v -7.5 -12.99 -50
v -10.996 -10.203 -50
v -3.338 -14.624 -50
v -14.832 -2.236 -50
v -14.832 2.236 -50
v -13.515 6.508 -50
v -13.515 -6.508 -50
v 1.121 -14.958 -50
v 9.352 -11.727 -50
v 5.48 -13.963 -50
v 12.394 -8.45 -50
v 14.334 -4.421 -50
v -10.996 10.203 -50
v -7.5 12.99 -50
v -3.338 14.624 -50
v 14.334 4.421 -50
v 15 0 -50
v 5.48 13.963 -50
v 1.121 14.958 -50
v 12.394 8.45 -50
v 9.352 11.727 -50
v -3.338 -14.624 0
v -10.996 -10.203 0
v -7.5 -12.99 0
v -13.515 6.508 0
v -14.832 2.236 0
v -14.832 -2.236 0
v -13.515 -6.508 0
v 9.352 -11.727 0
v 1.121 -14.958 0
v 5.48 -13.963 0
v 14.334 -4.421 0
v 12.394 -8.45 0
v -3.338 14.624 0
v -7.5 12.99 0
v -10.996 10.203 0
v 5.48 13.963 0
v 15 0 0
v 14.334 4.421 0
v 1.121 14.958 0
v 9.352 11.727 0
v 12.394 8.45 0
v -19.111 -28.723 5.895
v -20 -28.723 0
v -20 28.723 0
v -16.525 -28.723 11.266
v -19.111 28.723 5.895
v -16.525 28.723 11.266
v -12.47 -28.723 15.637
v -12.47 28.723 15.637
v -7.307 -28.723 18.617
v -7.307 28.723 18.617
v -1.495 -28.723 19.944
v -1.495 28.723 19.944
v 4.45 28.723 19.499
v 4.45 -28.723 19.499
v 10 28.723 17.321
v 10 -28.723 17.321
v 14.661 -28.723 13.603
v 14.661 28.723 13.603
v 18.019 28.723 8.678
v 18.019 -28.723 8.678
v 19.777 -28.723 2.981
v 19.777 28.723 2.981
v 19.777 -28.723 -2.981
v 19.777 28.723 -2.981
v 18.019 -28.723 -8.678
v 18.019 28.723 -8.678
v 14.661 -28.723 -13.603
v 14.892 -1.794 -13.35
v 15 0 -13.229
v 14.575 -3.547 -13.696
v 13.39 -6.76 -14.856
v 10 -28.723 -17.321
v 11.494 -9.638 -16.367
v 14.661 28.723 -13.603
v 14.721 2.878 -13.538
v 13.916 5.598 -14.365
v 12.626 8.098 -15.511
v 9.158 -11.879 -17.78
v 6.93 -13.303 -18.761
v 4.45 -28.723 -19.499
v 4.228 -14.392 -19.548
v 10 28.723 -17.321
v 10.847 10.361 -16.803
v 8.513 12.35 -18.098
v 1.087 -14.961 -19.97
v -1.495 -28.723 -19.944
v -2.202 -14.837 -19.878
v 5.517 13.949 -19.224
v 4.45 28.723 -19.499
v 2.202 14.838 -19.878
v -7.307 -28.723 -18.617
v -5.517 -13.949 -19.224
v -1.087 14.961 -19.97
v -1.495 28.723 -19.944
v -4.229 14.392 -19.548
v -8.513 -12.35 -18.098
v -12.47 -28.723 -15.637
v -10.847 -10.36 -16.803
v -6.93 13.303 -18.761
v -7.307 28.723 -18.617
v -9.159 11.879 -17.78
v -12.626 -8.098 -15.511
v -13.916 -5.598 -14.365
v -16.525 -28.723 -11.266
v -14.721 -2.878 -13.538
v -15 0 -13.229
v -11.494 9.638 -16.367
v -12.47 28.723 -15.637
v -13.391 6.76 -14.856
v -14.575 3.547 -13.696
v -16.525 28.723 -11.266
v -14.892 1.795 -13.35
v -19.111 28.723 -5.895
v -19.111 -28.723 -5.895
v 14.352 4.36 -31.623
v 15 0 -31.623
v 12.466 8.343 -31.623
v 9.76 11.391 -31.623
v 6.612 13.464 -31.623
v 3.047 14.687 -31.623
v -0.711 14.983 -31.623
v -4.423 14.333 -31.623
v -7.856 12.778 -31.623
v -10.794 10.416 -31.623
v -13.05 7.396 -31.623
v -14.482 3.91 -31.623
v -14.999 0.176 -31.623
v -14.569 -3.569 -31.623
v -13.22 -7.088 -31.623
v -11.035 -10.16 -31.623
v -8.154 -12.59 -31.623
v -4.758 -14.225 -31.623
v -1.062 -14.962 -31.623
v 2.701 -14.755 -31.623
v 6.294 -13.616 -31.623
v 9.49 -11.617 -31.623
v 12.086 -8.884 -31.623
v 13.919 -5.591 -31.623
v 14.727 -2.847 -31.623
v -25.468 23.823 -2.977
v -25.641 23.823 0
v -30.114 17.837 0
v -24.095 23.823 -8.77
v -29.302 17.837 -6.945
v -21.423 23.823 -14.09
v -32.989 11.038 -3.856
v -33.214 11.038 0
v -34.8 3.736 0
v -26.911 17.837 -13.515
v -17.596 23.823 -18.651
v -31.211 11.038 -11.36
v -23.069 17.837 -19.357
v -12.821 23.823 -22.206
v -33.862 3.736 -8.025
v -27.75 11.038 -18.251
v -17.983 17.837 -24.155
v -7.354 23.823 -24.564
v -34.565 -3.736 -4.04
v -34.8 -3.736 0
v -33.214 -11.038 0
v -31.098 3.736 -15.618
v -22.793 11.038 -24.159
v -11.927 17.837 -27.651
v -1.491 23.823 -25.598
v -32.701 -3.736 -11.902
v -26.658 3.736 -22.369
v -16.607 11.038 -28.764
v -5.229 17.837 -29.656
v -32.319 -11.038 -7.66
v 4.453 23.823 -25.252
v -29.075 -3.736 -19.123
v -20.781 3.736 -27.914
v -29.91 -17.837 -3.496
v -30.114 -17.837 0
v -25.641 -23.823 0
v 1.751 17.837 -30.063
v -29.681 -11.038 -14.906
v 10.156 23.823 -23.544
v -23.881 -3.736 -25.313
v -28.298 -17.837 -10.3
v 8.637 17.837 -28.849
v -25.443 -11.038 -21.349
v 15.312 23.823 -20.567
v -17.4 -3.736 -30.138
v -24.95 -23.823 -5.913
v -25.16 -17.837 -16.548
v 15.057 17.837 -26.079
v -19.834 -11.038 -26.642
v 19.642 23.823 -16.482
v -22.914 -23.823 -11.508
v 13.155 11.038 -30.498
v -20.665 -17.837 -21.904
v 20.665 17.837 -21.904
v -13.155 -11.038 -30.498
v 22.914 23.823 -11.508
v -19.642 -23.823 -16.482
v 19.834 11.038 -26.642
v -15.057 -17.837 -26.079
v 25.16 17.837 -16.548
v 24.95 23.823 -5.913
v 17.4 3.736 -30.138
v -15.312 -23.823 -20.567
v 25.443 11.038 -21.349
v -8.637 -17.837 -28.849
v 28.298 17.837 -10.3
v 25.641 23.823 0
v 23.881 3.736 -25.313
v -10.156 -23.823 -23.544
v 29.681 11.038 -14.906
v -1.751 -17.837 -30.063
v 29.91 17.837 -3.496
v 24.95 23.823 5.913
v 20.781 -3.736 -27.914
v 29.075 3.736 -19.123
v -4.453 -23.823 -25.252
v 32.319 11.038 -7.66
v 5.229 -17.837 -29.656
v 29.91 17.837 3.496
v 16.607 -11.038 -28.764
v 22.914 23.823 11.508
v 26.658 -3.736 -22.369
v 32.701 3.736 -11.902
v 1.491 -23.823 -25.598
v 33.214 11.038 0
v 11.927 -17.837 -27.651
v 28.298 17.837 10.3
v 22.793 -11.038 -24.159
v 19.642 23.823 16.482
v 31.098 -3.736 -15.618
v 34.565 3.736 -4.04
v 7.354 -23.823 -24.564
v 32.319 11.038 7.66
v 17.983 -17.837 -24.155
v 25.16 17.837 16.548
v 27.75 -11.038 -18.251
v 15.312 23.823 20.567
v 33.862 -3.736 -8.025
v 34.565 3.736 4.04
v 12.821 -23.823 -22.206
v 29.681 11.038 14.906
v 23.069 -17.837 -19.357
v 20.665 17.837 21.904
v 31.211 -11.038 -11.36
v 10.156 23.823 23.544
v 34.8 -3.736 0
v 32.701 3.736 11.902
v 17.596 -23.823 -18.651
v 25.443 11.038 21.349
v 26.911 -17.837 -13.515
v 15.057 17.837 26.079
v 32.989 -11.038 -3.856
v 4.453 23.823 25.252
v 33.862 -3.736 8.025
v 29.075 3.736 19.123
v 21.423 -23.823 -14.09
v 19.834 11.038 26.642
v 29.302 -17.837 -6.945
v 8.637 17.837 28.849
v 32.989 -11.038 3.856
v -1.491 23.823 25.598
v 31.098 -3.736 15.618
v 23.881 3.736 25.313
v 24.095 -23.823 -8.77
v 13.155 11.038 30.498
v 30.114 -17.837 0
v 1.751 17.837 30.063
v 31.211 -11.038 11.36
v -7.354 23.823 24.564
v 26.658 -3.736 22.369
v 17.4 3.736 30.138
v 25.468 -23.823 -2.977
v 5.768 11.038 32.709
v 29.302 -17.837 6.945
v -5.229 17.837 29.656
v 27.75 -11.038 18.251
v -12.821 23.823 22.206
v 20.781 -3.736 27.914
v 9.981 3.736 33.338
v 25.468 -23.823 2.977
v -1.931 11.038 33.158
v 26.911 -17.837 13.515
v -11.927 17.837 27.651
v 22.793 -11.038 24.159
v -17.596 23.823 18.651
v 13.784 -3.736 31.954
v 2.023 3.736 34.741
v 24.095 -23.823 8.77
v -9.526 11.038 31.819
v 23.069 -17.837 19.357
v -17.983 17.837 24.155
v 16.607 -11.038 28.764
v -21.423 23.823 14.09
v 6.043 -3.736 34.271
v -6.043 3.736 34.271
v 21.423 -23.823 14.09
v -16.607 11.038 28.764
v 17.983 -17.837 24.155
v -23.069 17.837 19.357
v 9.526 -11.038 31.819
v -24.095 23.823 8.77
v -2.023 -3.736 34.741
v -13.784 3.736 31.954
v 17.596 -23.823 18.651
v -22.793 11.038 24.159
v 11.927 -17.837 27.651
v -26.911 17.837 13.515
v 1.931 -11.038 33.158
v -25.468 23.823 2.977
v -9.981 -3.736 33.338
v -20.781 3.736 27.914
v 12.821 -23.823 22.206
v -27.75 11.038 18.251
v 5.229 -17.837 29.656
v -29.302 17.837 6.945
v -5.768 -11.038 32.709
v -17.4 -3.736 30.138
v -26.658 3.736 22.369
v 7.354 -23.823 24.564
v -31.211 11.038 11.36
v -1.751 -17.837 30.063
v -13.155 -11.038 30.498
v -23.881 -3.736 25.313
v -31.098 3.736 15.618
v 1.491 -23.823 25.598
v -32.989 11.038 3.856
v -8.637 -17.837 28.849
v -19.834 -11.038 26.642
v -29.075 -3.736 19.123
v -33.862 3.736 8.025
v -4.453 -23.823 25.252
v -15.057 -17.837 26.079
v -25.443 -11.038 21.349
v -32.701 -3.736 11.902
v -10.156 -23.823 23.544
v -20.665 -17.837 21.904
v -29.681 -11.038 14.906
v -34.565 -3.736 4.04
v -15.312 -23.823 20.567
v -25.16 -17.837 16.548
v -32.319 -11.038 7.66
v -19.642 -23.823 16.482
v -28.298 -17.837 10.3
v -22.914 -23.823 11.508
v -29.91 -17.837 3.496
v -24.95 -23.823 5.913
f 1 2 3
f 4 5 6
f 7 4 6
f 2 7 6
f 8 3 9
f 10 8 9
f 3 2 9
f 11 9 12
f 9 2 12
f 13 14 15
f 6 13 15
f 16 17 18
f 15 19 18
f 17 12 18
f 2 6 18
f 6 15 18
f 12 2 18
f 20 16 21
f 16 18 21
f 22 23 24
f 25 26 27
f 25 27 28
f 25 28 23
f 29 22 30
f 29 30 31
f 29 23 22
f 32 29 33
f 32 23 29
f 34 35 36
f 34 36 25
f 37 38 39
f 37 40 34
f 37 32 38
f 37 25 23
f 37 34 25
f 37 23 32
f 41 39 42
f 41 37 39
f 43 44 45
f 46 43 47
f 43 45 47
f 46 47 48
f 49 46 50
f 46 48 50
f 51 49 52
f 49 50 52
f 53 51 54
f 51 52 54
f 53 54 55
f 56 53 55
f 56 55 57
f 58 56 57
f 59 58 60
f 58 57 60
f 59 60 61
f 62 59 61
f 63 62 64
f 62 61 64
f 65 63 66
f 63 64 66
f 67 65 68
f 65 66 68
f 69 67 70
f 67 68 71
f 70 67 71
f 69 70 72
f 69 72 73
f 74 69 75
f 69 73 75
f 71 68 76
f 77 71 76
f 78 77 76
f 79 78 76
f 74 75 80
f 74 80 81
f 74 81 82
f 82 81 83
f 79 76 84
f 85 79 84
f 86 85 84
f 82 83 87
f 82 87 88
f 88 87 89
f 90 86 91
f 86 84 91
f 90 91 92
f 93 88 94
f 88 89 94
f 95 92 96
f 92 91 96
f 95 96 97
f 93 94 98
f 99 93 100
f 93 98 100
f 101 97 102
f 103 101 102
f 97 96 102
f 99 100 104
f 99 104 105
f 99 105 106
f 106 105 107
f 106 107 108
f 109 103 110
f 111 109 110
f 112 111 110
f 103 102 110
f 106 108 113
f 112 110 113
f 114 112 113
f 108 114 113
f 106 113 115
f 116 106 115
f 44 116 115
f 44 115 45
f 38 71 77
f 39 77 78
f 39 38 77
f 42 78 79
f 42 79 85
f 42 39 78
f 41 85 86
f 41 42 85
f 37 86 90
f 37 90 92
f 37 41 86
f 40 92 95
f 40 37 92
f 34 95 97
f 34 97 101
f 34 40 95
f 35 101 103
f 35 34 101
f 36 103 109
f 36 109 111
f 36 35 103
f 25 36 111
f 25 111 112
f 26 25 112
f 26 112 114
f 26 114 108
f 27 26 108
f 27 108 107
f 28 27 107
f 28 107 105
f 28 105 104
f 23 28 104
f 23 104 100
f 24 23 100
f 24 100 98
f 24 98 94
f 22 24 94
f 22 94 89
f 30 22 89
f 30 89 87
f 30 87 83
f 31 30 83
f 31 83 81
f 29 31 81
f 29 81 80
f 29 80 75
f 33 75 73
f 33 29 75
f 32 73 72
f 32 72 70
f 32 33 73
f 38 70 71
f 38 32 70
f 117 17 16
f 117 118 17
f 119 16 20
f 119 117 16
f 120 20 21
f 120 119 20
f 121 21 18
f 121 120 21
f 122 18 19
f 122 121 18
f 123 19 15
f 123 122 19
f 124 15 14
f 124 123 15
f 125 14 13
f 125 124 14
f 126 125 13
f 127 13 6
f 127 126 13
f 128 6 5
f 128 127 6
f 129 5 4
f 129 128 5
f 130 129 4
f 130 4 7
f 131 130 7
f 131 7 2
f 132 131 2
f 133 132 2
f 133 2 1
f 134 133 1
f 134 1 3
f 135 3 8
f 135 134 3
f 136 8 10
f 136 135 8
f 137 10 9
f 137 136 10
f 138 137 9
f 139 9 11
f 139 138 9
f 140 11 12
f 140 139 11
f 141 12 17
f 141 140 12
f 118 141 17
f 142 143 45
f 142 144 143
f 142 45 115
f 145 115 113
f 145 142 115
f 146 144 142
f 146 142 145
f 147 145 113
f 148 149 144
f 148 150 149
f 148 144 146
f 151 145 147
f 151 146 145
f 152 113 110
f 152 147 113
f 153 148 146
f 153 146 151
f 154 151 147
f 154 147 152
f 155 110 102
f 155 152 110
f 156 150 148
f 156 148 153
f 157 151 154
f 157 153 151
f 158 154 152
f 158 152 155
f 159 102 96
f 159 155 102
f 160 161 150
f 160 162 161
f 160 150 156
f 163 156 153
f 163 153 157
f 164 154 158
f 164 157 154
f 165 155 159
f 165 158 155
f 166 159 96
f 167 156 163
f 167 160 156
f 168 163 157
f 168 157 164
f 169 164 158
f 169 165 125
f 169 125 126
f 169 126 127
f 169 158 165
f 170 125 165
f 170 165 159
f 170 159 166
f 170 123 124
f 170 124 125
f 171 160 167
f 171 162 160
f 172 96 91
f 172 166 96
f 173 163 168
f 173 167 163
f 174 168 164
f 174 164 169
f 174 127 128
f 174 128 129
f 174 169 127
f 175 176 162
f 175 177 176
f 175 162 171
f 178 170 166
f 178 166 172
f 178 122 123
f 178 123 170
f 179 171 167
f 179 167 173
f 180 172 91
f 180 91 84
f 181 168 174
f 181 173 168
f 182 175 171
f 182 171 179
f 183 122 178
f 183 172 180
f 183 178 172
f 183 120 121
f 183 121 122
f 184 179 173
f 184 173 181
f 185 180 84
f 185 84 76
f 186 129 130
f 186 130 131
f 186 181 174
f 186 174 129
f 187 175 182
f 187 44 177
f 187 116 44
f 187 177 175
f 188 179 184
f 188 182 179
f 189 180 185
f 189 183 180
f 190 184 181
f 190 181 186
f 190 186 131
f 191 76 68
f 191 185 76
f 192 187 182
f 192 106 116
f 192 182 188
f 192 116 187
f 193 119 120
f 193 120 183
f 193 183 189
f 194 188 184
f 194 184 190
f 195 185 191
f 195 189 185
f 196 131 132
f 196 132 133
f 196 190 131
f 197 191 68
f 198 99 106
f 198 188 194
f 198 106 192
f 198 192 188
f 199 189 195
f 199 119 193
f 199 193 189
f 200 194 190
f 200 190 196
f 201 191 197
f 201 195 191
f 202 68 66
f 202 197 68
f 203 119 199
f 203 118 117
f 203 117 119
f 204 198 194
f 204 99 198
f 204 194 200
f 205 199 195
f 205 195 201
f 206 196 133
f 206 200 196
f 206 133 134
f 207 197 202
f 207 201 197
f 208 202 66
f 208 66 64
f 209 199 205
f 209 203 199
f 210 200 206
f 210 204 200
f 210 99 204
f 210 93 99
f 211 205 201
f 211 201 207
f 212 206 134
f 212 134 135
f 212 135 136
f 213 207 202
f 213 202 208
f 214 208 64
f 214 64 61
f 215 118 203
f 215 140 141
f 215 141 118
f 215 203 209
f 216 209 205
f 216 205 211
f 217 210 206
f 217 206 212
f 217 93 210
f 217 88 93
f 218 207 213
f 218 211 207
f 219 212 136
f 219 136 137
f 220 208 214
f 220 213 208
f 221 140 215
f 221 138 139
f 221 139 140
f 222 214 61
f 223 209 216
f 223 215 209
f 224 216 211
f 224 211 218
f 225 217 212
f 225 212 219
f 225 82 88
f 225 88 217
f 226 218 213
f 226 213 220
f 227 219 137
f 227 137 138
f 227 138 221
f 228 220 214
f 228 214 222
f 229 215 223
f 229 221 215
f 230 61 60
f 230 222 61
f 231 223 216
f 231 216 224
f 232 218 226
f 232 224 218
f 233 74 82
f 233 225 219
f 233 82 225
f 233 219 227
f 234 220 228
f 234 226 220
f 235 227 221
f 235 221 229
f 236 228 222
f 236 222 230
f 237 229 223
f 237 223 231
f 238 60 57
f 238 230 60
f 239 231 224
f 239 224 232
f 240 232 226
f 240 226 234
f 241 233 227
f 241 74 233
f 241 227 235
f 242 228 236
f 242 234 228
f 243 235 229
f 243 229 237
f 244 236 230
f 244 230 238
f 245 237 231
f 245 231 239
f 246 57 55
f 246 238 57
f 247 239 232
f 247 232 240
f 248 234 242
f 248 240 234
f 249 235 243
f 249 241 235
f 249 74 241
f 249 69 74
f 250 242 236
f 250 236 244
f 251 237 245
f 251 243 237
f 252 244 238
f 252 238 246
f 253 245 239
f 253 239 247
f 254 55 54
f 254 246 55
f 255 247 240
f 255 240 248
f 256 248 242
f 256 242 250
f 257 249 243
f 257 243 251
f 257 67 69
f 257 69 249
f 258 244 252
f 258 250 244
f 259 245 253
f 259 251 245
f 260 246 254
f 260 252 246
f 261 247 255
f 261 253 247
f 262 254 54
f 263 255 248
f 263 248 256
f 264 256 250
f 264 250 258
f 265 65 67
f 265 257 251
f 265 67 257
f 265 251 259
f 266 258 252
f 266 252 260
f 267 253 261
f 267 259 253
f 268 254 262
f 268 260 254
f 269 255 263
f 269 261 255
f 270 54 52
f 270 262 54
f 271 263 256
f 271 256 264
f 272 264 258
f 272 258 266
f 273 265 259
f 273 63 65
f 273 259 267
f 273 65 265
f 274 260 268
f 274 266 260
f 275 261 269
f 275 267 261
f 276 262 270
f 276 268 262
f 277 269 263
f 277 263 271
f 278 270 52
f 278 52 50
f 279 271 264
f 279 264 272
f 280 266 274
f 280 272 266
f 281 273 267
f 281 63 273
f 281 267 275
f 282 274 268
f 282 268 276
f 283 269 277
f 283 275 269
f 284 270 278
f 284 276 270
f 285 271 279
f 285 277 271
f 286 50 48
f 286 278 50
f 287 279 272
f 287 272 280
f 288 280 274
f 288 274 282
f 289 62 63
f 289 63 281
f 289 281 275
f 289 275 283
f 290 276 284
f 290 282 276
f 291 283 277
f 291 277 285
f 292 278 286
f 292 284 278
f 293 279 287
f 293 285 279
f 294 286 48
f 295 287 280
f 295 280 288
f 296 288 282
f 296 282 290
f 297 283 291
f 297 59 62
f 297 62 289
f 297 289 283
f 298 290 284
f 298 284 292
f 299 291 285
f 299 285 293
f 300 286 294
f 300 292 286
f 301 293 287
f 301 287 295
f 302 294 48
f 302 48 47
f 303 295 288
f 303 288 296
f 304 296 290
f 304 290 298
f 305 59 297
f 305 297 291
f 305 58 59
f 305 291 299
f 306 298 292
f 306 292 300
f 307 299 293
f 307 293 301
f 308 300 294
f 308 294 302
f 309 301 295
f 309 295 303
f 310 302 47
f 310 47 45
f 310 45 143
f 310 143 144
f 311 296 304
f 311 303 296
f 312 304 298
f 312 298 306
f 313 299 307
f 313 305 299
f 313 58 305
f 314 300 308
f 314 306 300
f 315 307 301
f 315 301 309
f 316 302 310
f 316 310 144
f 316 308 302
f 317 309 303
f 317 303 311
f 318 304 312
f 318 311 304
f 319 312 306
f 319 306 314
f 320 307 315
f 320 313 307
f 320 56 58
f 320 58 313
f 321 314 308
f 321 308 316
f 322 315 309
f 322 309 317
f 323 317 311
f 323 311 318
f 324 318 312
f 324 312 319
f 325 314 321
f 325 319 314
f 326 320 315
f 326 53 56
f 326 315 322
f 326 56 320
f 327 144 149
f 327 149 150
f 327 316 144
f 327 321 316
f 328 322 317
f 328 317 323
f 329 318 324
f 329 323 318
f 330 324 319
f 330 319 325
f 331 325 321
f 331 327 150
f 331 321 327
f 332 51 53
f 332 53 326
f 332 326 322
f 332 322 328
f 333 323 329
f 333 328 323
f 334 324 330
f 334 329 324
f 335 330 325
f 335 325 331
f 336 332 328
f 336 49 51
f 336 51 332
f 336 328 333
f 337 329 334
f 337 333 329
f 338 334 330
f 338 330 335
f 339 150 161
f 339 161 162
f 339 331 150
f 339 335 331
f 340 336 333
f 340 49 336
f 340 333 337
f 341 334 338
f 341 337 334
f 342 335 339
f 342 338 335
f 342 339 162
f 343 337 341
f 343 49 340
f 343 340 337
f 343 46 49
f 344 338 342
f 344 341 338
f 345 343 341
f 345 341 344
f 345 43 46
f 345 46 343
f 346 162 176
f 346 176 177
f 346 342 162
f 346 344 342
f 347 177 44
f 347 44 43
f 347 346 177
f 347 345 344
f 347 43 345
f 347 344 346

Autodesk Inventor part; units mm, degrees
ref_plane "YZ Plane" through (0, 0, 0) normal (1, 0, 0) x (0, 1, 0)
sketch "スケッチ1" plane through (0, 0, 0) normal (0, 0, 1) x (1, 0, 0)
  arc A0 (0, 35) -> (0, -35) centre (0, 0) ccw
  line L0 (0, 35) -> (0, -35)
  dimension "d0" = 70
revolve "回転1" add sketch "スケッチ1" angle 360 about axis through (0, 35, 0) along (0, -1, 0)
sketch "スケッチ2" plane through (0, 0, 0) normal (0, 1, 0) x (-1, 0, 0)
  circle A0 centre (0, 0) radius 20
  dimension "d2" = 40
extrude "押し出し1" cut sketch "スケッチ2" along normal mid plane 100
sketch "スケッチ3" plane through (0, 0, 0) normal (0, 0, 1) x (1, 0, 0)
  circle A0 centre (0, 0) radius 15
  dimension "d5" = 30
extrude "押し出し2" add sketch "スケッチ3" against normal blind 50
properties part number "HandP"
